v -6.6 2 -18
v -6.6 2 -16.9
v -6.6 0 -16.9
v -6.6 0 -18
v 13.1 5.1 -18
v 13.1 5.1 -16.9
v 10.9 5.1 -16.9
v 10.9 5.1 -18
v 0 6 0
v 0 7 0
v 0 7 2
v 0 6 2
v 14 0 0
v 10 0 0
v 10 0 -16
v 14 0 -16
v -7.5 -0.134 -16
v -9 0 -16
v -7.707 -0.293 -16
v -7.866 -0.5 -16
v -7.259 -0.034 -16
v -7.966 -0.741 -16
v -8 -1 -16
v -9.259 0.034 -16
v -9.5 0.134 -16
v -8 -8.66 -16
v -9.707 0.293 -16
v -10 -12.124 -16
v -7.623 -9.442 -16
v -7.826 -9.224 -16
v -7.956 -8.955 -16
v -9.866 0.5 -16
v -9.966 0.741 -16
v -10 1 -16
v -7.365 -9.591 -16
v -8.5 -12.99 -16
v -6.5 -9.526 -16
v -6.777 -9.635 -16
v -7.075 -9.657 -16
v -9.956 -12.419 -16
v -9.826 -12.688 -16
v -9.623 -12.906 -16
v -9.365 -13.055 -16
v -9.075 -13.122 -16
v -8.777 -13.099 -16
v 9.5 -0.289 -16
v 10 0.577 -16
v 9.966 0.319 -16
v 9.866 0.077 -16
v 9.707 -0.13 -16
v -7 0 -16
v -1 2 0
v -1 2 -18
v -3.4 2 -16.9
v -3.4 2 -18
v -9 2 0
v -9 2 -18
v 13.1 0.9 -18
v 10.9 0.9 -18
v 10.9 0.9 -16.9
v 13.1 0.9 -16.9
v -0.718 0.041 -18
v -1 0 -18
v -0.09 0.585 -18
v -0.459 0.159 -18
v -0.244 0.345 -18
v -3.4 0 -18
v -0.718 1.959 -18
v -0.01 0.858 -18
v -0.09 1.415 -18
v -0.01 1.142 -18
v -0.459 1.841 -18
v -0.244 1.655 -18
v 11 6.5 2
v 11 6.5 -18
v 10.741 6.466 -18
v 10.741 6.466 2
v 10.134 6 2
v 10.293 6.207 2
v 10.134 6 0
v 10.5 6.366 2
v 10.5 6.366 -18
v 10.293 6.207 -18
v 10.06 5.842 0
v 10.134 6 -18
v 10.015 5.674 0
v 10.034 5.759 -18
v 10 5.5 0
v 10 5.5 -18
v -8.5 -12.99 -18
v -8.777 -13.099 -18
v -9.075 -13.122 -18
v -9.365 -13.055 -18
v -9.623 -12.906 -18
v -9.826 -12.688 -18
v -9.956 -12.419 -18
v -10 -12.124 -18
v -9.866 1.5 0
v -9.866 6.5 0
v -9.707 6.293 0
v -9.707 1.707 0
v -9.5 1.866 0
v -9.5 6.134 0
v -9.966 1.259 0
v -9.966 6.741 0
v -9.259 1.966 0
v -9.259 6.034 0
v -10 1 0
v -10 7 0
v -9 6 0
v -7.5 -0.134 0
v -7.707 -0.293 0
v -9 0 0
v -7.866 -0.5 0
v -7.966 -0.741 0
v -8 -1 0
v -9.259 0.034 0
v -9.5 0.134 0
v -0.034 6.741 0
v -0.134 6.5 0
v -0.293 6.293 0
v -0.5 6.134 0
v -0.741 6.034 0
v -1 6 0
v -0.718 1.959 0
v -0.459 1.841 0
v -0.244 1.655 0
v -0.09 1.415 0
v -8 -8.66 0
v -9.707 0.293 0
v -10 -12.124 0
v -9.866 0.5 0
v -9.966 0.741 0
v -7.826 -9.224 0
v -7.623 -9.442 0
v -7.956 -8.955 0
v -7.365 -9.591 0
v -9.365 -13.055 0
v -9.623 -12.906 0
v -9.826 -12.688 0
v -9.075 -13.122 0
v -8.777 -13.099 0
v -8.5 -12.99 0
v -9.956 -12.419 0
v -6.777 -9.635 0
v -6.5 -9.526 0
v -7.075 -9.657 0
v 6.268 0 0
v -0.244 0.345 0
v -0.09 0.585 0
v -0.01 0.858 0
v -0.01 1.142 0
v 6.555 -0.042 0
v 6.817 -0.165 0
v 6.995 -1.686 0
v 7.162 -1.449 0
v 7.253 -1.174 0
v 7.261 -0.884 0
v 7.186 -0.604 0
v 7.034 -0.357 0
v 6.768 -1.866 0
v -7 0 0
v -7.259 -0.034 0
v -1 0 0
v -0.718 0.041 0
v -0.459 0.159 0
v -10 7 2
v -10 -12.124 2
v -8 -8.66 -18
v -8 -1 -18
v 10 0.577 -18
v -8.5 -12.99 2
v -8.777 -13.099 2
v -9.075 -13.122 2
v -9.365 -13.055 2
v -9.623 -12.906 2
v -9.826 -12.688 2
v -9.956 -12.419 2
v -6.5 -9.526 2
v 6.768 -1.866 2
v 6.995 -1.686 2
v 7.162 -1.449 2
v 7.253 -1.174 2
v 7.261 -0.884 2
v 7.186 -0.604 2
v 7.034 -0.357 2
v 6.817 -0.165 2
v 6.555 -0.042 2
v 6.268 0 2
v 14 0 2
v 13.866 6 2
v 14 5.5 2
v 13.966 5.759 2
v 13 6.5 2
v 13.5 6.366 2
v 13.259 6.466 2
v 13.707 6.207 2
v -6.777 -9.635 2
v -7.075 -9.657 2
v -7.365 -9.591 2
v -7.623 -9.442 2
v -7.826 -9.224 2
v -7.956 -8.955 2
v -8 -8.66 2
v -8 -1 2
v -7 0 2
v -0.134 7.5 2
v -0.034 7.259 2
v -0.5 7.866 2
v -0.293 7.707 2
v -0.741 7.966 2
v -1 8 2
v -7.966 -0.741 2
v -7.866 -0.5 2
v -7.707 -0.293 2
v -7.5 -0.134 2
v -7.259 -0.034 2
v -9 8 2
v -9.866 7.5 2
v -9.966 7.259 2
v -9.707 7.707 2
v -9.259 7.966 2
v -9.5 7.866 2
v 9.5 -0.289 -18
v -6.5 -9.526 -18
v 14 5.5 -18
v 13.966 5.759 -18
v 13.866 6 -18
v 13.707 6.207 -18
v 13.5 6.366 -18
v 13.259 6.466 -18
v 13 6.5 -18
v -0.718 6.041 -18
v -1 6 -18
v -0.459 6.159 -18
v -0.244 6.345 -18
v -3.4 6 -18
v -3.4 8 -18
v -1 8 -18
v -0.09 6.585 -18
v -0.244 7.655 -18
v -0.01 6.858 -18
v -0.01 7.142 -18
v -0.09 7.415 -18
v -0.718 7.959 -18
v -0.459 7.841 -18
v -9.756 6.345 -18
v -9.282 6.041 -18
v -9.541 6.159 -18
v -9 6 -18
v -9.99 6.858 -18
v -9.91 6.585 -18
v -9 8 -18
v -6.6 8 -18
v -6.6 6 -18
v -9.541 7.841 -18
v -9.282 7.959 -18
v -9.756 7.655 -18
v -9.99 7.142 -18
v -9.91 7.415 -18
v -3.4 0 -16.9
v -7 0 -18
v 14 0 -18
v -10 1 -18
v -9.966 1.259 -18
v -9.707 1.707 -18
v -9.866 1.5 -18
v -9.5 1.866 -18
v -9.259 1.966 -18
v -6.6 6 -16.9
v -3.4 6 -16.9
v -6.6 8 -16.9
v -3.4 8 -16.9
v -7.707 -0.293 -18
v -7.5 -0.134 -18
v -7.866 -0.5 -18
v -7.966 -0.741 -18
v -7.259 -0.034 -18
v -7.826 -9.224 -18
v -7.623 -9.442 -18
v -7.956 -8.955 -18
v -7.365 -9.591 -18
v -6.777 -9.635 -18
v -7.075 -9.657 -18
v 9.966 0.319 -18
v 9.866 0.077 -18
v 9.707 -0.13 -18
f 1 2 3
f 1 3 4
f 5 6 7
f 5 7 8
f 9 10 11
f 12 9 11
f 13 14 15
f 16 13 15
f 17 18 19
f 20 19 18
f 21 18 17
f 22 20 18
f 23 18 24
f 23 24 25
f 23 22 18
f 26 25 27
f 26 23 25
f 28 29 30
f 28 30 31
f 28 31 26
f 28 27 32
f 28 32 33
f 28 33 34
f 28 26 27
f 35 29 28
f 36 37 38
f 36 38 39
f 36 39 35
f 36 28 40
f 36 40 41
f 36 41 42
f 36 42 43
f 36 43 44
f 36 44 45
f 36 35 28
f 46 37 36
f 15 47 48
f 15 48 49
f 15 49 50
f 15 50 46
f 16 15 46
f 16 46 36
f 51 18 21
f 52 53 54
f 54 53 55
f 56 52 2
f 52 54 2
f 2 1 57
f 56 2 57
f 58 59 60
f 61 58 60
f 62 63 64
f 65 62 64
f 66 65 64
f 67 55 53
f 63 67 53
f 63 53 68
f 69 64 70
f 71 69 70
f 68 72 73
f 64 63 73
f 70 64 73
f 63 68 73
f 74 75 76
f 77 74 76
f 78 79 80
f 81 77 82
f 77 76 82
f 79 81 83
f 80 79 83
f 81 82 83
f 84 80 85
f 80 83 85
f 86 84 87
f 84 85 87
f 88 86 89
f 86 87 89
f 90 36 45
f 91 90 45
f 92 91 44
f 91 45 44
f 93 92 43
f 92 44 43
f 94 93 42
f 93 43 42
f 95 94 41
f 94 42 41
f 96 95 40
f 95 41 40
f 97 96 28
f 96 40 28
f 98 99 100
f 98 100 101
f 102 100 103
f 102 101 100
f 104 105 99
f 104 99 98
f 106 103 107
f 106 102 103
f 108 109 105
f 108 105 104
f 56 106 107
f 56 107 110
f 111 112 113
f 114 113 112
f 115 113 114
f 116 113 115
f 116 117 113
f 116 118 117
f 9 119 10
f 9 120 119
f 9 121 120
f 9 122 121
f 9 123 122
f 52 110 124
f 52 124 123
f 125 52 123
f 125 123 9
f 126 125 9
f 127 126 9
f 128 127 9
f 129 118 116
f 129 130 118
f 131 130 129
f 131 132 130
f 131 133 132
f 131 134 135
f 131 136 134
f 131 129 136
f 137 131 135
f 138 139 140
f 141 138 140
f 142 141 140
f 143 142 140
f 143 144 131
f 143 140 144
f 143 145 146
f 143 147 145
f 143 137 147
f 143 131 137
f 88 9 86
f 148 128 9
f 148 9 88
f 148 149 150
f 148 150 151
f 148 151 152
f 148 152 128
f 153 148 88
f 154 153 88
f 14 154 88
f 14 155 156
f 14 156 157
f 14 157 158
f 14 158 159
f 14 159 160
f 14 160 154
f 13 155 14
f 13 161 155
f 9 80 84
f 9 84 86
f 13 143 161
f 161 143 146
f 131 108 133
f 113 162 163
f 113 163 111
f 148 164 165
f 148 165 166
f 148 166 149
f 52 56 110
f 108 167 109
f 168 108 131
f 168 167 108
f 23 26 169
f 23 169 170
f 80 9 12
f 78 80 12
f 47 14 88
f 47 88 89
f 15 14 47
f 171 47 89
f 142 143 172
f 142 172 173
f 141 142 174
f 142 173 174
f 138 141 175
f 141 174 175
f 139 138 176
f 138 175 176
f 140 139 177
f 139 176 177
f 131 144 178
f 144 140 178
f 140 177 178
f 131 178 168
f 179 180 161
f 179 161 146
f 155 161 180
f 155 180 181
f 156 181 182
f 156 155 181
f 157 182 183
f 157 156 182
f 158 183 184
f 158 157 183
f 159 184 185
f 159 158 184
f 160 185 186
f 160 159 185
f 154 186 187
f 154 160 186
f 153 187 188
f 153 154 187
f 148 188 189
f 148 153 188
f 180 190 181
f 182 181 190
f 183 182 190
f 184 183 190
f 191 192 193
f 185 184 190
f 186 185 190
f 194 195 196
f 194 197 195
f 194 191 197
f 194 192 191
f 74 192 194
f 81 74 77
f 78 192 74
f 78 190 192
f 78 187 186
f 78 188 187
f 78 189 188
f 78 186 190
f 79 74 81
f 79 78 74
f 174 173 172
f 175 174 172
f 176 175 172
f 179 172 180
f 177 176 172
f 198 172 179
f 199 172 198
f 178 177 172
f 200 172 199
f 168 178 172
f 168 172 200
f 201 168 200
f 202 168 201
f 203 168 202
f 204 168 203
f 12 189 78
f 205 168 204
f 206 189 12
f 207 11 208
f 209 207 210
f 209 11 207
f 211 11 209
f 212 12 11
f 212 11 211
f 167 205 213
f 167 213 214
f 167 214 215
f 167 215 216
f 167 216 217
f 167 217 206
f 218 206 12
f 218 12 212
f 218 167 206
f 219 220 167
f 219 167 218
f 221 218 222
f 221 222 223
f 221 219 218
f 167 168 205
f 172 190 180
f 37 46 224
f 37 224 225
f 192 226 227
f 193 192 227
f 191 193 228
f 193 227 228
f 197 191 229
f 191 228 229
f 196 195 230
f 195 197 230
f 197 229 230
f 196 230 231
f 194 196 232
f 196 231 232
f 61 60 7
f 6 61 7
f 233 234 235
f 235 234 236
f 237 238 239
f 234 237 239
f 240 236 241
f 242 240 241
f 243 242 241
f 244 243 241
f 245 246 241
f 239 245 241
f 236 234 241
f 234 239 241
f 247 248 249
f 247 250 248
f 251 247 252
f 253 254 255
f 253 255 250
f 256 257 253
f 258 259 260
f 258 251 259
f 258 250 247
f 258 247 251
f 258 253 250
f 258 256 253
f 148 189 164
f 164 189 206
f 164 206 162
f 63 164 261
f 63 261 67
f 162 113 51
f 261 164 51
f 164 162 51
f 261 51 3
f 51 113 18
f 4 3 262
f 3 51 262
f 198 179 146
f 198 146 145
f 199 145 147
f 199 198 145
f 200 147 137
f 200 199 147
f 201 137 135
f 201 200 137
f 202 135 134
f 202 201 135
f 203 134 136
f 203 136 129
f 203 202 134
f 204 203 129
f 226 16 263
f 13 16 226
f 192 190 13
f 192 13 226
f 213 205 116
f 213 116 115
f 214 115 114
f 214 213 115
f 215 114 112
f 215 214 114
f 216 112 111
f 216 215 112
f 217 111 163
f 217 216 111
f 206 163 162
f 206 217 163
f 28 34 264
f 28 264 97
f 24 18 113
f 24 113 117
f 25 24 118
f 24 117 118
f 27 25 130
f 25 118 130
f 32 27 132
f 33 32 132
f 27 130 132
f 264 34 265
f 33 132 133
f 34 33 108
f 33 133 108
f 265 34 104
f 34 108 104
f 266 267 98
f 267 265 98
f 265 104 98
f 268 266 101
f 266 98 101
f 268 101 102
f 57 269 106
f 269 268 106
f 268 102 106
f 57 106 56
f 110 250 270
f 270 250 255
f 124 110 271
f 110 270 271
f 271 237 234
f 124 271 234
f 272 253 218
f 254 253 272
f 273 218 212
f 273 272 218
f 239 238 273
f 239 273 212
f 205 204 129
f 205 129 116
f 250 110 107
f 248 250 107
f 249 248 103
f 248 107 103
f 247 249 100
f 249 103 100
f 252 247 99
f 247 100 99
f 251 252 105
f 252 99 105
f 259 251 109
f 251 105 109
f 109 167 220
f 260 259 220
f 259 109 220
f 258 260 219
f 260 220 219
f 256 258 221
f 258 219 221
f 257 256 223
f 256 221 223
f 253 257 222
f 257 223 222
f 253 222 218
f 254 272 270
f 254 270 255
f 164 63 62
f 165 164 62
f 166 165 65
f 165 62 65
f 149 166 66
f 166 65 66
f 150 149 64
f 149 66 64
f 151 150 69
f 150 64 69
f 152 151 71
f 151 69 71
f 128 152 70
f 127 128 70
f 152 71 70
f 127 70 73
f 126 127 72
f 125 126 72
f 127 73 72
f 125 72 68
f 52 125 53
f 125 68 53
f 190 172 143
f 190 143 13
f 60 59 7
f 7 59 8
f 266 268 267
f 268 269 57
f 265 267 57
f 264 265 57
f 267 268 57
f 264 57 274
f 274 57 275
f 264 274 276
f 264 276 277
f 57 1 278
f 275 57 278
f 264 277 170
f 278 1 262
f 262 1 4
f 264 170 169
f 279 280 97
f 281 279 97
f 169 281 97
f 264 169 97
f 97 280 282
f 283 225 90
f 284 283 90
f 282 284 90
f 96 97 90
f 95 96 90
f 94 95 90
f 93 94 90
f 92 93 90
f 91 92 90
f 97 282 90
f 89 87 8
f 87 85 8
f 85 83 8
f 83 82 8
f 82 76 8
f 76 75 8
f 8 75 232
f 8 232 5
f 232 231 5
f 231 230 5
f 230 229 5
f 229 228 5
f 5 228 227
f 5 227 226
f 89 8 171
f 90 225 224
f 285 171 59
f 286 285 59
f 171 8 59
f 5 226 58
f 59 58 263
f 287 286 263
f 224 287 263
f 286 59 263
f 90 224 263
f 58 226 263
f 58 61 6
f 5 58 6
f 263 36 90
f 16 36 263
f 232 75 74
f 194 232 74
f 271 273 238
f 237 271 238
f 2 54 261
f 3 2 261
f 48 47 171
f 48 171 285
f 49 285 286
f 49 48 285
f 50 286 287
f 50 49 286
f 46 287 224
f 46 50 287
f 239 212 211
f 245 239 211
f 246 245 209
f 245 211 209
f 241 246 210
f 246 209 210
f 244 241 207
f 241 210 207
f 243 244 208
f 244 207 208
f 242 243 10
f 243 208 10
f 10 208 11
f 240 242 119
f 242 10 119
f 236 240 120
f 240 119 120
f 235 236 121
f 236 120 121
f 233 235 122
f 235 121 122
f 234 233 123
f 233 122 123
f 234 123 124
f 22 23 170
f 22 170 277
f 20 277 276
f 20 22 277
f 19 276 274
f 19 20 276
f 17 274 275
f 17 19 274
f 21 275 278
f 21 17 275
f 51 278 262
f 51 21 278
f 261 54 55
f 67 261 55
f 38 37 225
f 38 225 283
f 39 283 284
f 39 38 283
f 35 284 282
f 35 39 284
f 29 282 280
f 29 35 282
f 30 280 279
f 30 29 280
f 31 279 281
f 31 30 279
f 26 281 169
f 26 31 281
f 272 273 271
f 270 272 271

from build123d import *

# Parameters (mm, degrees)
SKETCH1_W           = 14
SKETCH1_H           = 22
SKETCH1_W_2         = 10
SKETCH1_H_2         = 18
EXTRUDE_THIN1_DEPTH = 2
SKETCH2_W           = 2
SKETCH2_H           = 22
BOSS_EXTRUDE1_DEPTH = 4.5
SKETCH3_W           = 22
SKETCH3_H           = 8
SKETCH3_W_2         = 18
SKETCH3_H_2         = 4
EXTRUDE_THIN2_DEPTH = 2
SKETCH4_W           = 2
SKETCH4_H           = 10.076871622
CUT_EXTRUDE1_DEPTH  = 26.690465157
SKETCH5_W           = 1.1
SKETCH5_H           = 4.2
SKETCH5_H_2         = 2
CUT_EXTRUDE2_DEPTH  = 1.1
BOSS_EXTRUDE2_DEPTH = 8
SKETCH7_W           = 2.5
SKETCH7_H           = 1.1
SKETCH7_W_2         = 0.9
BOSS_EXTRUDE3_DEPTH = 8
CUT_EXTRUDE3_DEPTH  = 1.1
BOSS_EXTRUDE4_REACH = 25.065
SKETCH9_W           = 2
SKETCH9_H           = 4
BOSS_EXTRUDE5_DEPTH = 2
SKETCH11_W          = 0.9
SKETCH11_H          = 4.2
BOSS_EXTRUDE6_DEPTH = 1.1
EXTRUDE_THIN4_DEPTH = 2
LPATTERN1_COUNT     = 2
LPATTERN1_PITCH     = 18
SKETCH14_W          = 2.2
SKETCH14_H          = 4.2
CUT_EXTRUDE4_DEPTH  = 2
FILLET1_R           = 1


with BuildPart() as part:
    # Sketch1 → Extrude-Thin1 (new body)
    with BuildSketch(Plane(origin=(0, 0, 0), x_dir=(1, 0, 0), z_dir=(0, 1, 0))):
        with Locations((5, 9)):
            Rectangle(SKETCH1_W, SKETCH1_H)
        with Locations((5, 9)):
            Rectangle(SKETCH1_W_2, SKETCH1_H_2, mode=Mode.SUBTRACT)
    extrude(amount=EXTRUDE_THIN1_DEPTH)

    # Sketch2 → Boss-Extrude1 (add)
    with BuildSketch(Plane(origin=(0, 2, 0), x_dir=(1, 0, 0), z_dir=(0, 1, 0))):
        with Locations((11, 9)):
            Rectangle(SKETCH2_W, SKETCH2_H)
    extrude(amount=BOSS_EXTRUDE1_DEPTH)

    # Sketch3 → Extrude-Thin2 (add)
    with BuildSketch(Plane.ZY.offset(2)):
        with Locations((-9, 4)):
            Rectangle(SKETCH3_W, SKETCH3_H)
        with Locations((-9, 4)):
            Rectangle(SKETCH3_W_2, SKETCH3_H_2, mode=Mode.SUBTRACT)
    extrude(amount=-EXTRUDE_THIN2_DEPTH)

    # Sketch4 → Cut-Extrude1 (cut, through all)
    with BuildSketch(Plane(origin=(12, 0, 0), x_dir=(0, 0, -1), z_dir=(1, 0, 0))):
        with Locations((19, 5.038435811)):
            Rectangle(SKETCH4_W, SKETCH4_H)
    extrude(amount=-CUT_EXTRUDE1_DEPTH, mode=Mode.SUBTRACT)

    # Sketch5 → Cut-Extrude2 (cut)
    with BuildSketch(Plane(origin=(0, 0, -18), x_dir=(-1, 0, 0), z_dir=(0, 0, -1))):
        with Locations((-11.45, 3)):
            Rectangle(SKETCH5_W, SKETCH5_H)
        with Locations((1.45, 7)):
            Rectangle(SKETCH5_W, SKETCH5_H_2)
        with Locations((1.45, 1)):
            Rectangle(SKETCH5_W, SKETCH5_H_2)
    extrude(amount=-CUT_EXTRUDE2_DEPTH, mode=Mode.SUBTRACT)

    # Sketch6 → Boss-Extrude2 (add)
    with BuildSketch(Plane.ZY.offset(2)):
        Polygon((-16.9, 2), (-16.9, 0), (2, 0), (2, 8), (-16.9, 8), (-16.9, 6), (0, 6), (0, 2), align=None)
    extrude(amount=BOSS_EXTRUDE2_DEPTH)

    # Sketch7 → Boss-Extrude3 (add, through all)
    with BuildSketch(Plane(origin=(0, 8, 0), x_dir=(1, 0, 0), z_dir=(0, 1, 0))):
        with Locations((-2.15, 17.45)):
            Rectangle(SKETCH7_W, SKETCH7_H)
        with Locations((-7.85, 17.45)):
            Rectangle(SKETCH7_W, SKETCH7_H)
        with Locations((-9.55, 17.45)):
            Rectangle(SKETCH7_W_2, SKETCH7_H)
    extrude(amount=-BOSS_EXTRUDE3_DEPTH)

    # Sketch8 → Cut-Extrude3 (cut)
    with BuildSketch(Plane(origin=(0, 0, -18), x_dir=(-1, 0, 0), z_dir=(0, 0, -1))):
        Polygon((6.6, 6), (0.9, 6), (0.9, 2), (6.6, 4.505494505), align=None)
        Polygon((6.6, 4.505494505), (0.9, 2), (6.6, 2), align=None)
        Polygon((10, 2), (10, 6), (6.6, 4.505494505), (6.6, 2), align=None)
        Polygon((10, 6), (6.6, 6), (6.6, 4.505494505), align=None)
    extrude(amount=-CUT_EXTRUDE3_DEPTH, mode=Mode.SUBTRACT)

    # Sketch9 → Boss-Extrude4 (add, up to next)
    with BuildSketch(Plane(origin=(0, 0, 0), x_dir=(0, 0, -1), z_dir=(1, 0, 0)), mode=Mode.PRIVATE) as boss_extrude4_sk1:
        with Locations((-1, 4)):
            Rectangle(SKETCH9_W, SKETCH9_H)
    boss_extrude4_tool1 = extrude(boss_extrude4_sk1.sketch, amount=BOSS_EXTRUDE4_REACH, mode=Mode.PRIVATE) - part.part
    add(boss_extrude4_tool1.solids().sort_by_distance((0, 4, 1))[0])

    # Sketch10 → Boss-Extrude5 (add)
    with BuildSketch(Plane(origin=(12, 0, 0), x_dir=(0, 0, -1), z_dir=(1, 0, 0))):
        Polygon((-2, 6.5), (-2, 0), (18, 0), (18, 0.9), (16.9, 0.9), (16.9, 5.1), (18, 5.1), (18, 6.5), align=None)
    extrude(amount=BOSS_EXTRUDE5_DEPTH)

    # Sketch11 → Boss-Extrude6 (add)
    with BuildSketch(Plane(origin=(0, 0, -16.9), x_dir=(-1, 0, 0), z_dir=(0, 0, -1))):
        with Locations((-13.55, 3)):
            Rectangle(SKETCH11_W, SKETCH11_H)
    extrude(amount=BOSS_EXTRUDE6_DEPTH)

    # Sketch13 → Extrude-Thin4 (add)
    with BuildSketch(Plane.XY.offset(2)):
        Polygon((-10, 0), (-10, -13.856406461), (14, 0), (13, 1.732050808), (-8, -10.392304845), (-8, 0), align=None)
    extrude_thin4 = extrude(amount=-EXTRUDE_THIN4_DEPTH)

    # LPattern1: Extrude-Thin4 ×2
    with Locations(*[(0, 0, -i * LPATTERN1_PITCH) for i in range(1, LPATTERN1_COUNT)]):
        add(extrude_thin4)

    # Sketch14 → Cut-Extrude4 (cut)
    with BuildSketch(Plane(origin=(0, 0, -16.9), x_dir=(-1, 0, 0), z_dir=(0, 0, -1))):
        with Locations((-12, 3)):
            Rectangle(SKETCH14_W, SKETCH14_H)
    extrude(amount=CUT_EXTRUDE4_DEPTH, mode=Mode.SUBTRACT)

    # Fillet1
    # the kernel refuses this fillet: 1 mm, written as the material it adds along each edge
    with BuildSketch(Plane(origin=(10, 0, 0), x_dir=(-0.866025403784438, -0.500000000000001, 0), z_dir=(0, 0, 1))) as fillet1_piece_1:
        with BuildLine():
            CenterArc((FILLET1_R * 3.73205080757, -FILLET1_R), FILLET1_R, 90, 150)
            Line((FILLET1_R * 3.23205080757, -FILLET1_R * 1.86602540378), (0, 0))
            Line((0, 0), (FILLET1_R * 3.73205080757, 0))
        make_face()
    extrude(amount=2)
    with BuildSketch(Plane(origin=(-8, -10.392304845, 2), x_dir=(0.8660254037844376, 0.5000000000000017, 0), z_dir=(0, 0, -1))) as fillet1_piece_2:
        with BuildLine():
            CenterArc((FILLET1_R * 1.73205080757, -FILLET1_R), FILLET1_R, 90, 120)
            Line((FILLET1_R * 0.866025403784, -FILLET1_R * 1.5), (0, 0))
            Line((0, 0), (FILLET1_R * 1.73205080757, 0))
        make_face()
    extrude(amount=2)
    with BuildSketch(Plane(origin=(-8, 0, 2), x_dir=(0, -1, 0), z_dir=(0, 0, -1)), Plane(origin=(-8, 0, -16), x_dir=(0, -1, 0), z_dir=(0, 0, -1))) as fillet1_piece_3:
        with BuildLine():
            CenterArc((FILLET1_R, -FILLET1_R), FILLET1_R, 90, 90)
            Line((0, -FILLET1_R), (0, 0))
            Line((0, 0), (FILLET1_R, 0))
        make_face()
    extrude(amount=2)
    with BuildSketch(Plane(origin=(10, 0, -16), x_dir=(0, 1, 0), z_dir=(0, 0, -1))) as fillet1_piece_4:
        with BuildLine():
            CenterArc((FILLET1_R * 0.57735026919, -FILLET1_R), FILLET1_R, 90, 60)
            Line((-FILLET1_R * 0.288675134595, -FILLET1_R * 0.5), (0, 0))
            Line((0, 0), (FILLET1_R * 0.57735026919, 0))
        make_face()
    extrude(amount=2)
    with BuildSketch(Plane(origin=(-8, -10.392304845, -16), x_dir=(0, 1, 0), z_dir=(0, 0, -1))) as fillet1_piece_5:
        with BuildLine():
            CenterArc((FILLET1_R * 1.73205080757, FILLET1_R), FILLET1_R, 150, 120)
            Line((FILLET1_R * 0.866025403784, FILLET1_R * 1.5), (0, 0))
            Line((0, 0), (FILLET1_R * 1.73205080757, 0))
        make_face()
    extrude(amount=2)
    # the kernel refuses this fillet: 1 mm, written as the material it takes off along each edge
    with BuildSketch(Plane(origin=(0, 0, -20.5), x_dir=(-1, 0, 0), z_dir=(0, 0, 1)), Plane(origin=(-10, 2, 0), x_dir=(0, -1, 0), z_dir=(0, 0, -1))) as fillet1_2_piece_1:
        with BuildLine():
            CenterArc((FILLET1_R, -FILLET1_R), FILLET1_R, 90, 90)
            Line((0, -FILLET1_R), (0, 0))
            Line((0, 0), (FILLET1_R, 0))
        make_face()
    extrude(amount=20.5, mode=Mode.SUBTRACT)
    with BuildSketch(Plane(origin=(0, 2, -20.5), x_dir=(-1, 0, 0), z_dir=(0, 0, 1)), Plane(origin=(-10, 6, -20.5), x_dir=(1, 0, 0), z_dir=(0, 0, 1)), Plane(origin=(0, 6, 0), x_dir=(-1, 0, 0), z_dir=(0, 0, -1))) as fillet1_2_piece_2:
        with BuildLine():
            CenterArc((FILLET1_R, FILLET1_R), FILLET1_R, 180, 90)
            Line((0, FILLET1_R), (0, 0))
            Line((0, 0), (FILLET1_R, 0))
        make_face()
    extrude(amount=20.5, mode=Mode.SUBTRACT)
    with BuildSketch(Plane(origin=(-10, 8, 4.5), x_dir=(1, 0, 0), z_dir=(0, 0, -1)), Plane(origin=(14, 6.5, -20.5), x_dir=(-1, 0, 0), z_dir=(0, 0, 1))) as fillet1_2_piece_3:
        with BuildLine():
            CenterArc((FILLET1_R, FILLET1_R), FILLET1_R, 180, 90)
            Line((0, FILLET1_R), (0, 0))
            Line((0, 0), (FILLET1_R, 0))
        make_face()
    extrude(amount=25, mode=Mode.SUBTRACT)
    with BuildSketch(Plane(origin=(-10, -13.856406461, 6.330127019), x_dir=(0.866025403784438, 0.5000000000000009, 0), z_dir=(0, 0, -1))) as fillet1_2_piece_4:
        with BuildLine():
            CenterArc((FILLET1_R * 1.73205080757, -FILLET1_R), FILLET1_R, 90, 120)
            Line((FILLET1_R * 0.866025403784, -FILLET1_R * 1.5), (0, 0))
            Line((0, 0), (FILLET1_R * 1.73205080757, 0))
        make_face()
    extrude(amount=10.660254038, mode=Mode.SUBTRACT)
    with BuildSketch(Plane(origin=(0, 8, 4.5), x_dir=(-1, 0, 0), z_dir=(0, 0, -1))) as fillet1_2_piece_5:
        with BuildLine():
            CenterArc((FILLET1_R, -FILLET1_R), FILLET1_R, 90, 90)
            Line((0, -FILLET1_R), (0, 0))
            Line((0, 0), (FILLET1_R, 0))
        make_face()
    extrude(amount=25, mode=Mode.SUBTRACT)
    with BuildSketch(Plane(origin=(10, 6.5, -20.5), x_dir=(1, 0, 0), z_dir=(0, 0, 1))) as fillet1_2_piece_6_section:
        with BuildLine():
            CenterArc((FILLET1_R, -FILLET1_R), FILLET1_R, 90, 90)
            Line((0, -FILLET1_R), (0, 0))
            Line((0, 0), (FILLET1_R, 0))
        make_face()
    fillet1_2_piece_6 = extrude(amount=25, mode=Mode.PRIVATE)
    fillet1_2_piece_6 = split(fillet1_2_piece_6, bisect_by=Plane(origin=(10.244024849, 6, -9), z_dir=(0, 1, 0)), keep=Keep.TOP, mode=Mode.PRIVATE)
    add(fillet1_2_piece_6, mode=Mode.SUBTRACT)
    with BuildSketch(Plane(origin=(10, 6.5, -20.5), x_dir=(1, 0, 0), z_dir=(0, 0, 1))) as fillet1_2_piece_7_section:
        with BuildLine():
            CenterArc((FILLET1_R, -FILLET1_R), FILLET1_R, 90, 90)
            Line((0, -FILLET1_R), (0, 0))
            Line((0, 0), (FILLET1_R, 0))
        make_face()
    fillet1_2_piece_7 = extrude(amount=25, mode=Mode.PRIVATE)
    fillet1_2_piece_7 = split(fillet1_2_piece_7, bisect_by=Plane(origin=(10.039684593, 5.876736387, 0), z_dir=(0, 0, -1)), keep=Keep.TOP, mode=Mode.PRIVATE)
    add(fillet1_2_piece_7, mode=Mode.SUBTRACT)
    with BuildSketch(Plane(origin=(-10, 0, 0), x_dir=(1, 0, 0), z_dir=(0, 0, -1))) as fillet1_2_piece_8:
        with BuildLine():
            CenterArc((FILLET1_R, -FILLET1_R), FILLET1_R, 90, 90)
            Line((0, -FILLET1_R), (0, 0))
            Line((0, 0), (FILLET1_R, 0))
        make_face()
    extrude(amount=16, mode=Mode.SUBTRACT)
    with BuildSketch(Plane(origin=(-10, -13.856406461, -11.669872981), x_dir=(0, 1, 0), z_dir=(0, 0, -1))) as fillet1_2_piece_9:
        with BuildLine():
            CenterArc((FILLET1_R * 1.73205080757, FILLET1_R), FILLET1_R, 150, 120)
            Line((FILLET1_R * 0.866025403784, FILLET1_R * 1.5), (0, 0))
            Line((0, 0), (FILLET1_R * 1.73205080757, 0))
        make_face()
    extrude(amount=10.660254038, mode=Mode.SUBTRACT)


solid = part.part
